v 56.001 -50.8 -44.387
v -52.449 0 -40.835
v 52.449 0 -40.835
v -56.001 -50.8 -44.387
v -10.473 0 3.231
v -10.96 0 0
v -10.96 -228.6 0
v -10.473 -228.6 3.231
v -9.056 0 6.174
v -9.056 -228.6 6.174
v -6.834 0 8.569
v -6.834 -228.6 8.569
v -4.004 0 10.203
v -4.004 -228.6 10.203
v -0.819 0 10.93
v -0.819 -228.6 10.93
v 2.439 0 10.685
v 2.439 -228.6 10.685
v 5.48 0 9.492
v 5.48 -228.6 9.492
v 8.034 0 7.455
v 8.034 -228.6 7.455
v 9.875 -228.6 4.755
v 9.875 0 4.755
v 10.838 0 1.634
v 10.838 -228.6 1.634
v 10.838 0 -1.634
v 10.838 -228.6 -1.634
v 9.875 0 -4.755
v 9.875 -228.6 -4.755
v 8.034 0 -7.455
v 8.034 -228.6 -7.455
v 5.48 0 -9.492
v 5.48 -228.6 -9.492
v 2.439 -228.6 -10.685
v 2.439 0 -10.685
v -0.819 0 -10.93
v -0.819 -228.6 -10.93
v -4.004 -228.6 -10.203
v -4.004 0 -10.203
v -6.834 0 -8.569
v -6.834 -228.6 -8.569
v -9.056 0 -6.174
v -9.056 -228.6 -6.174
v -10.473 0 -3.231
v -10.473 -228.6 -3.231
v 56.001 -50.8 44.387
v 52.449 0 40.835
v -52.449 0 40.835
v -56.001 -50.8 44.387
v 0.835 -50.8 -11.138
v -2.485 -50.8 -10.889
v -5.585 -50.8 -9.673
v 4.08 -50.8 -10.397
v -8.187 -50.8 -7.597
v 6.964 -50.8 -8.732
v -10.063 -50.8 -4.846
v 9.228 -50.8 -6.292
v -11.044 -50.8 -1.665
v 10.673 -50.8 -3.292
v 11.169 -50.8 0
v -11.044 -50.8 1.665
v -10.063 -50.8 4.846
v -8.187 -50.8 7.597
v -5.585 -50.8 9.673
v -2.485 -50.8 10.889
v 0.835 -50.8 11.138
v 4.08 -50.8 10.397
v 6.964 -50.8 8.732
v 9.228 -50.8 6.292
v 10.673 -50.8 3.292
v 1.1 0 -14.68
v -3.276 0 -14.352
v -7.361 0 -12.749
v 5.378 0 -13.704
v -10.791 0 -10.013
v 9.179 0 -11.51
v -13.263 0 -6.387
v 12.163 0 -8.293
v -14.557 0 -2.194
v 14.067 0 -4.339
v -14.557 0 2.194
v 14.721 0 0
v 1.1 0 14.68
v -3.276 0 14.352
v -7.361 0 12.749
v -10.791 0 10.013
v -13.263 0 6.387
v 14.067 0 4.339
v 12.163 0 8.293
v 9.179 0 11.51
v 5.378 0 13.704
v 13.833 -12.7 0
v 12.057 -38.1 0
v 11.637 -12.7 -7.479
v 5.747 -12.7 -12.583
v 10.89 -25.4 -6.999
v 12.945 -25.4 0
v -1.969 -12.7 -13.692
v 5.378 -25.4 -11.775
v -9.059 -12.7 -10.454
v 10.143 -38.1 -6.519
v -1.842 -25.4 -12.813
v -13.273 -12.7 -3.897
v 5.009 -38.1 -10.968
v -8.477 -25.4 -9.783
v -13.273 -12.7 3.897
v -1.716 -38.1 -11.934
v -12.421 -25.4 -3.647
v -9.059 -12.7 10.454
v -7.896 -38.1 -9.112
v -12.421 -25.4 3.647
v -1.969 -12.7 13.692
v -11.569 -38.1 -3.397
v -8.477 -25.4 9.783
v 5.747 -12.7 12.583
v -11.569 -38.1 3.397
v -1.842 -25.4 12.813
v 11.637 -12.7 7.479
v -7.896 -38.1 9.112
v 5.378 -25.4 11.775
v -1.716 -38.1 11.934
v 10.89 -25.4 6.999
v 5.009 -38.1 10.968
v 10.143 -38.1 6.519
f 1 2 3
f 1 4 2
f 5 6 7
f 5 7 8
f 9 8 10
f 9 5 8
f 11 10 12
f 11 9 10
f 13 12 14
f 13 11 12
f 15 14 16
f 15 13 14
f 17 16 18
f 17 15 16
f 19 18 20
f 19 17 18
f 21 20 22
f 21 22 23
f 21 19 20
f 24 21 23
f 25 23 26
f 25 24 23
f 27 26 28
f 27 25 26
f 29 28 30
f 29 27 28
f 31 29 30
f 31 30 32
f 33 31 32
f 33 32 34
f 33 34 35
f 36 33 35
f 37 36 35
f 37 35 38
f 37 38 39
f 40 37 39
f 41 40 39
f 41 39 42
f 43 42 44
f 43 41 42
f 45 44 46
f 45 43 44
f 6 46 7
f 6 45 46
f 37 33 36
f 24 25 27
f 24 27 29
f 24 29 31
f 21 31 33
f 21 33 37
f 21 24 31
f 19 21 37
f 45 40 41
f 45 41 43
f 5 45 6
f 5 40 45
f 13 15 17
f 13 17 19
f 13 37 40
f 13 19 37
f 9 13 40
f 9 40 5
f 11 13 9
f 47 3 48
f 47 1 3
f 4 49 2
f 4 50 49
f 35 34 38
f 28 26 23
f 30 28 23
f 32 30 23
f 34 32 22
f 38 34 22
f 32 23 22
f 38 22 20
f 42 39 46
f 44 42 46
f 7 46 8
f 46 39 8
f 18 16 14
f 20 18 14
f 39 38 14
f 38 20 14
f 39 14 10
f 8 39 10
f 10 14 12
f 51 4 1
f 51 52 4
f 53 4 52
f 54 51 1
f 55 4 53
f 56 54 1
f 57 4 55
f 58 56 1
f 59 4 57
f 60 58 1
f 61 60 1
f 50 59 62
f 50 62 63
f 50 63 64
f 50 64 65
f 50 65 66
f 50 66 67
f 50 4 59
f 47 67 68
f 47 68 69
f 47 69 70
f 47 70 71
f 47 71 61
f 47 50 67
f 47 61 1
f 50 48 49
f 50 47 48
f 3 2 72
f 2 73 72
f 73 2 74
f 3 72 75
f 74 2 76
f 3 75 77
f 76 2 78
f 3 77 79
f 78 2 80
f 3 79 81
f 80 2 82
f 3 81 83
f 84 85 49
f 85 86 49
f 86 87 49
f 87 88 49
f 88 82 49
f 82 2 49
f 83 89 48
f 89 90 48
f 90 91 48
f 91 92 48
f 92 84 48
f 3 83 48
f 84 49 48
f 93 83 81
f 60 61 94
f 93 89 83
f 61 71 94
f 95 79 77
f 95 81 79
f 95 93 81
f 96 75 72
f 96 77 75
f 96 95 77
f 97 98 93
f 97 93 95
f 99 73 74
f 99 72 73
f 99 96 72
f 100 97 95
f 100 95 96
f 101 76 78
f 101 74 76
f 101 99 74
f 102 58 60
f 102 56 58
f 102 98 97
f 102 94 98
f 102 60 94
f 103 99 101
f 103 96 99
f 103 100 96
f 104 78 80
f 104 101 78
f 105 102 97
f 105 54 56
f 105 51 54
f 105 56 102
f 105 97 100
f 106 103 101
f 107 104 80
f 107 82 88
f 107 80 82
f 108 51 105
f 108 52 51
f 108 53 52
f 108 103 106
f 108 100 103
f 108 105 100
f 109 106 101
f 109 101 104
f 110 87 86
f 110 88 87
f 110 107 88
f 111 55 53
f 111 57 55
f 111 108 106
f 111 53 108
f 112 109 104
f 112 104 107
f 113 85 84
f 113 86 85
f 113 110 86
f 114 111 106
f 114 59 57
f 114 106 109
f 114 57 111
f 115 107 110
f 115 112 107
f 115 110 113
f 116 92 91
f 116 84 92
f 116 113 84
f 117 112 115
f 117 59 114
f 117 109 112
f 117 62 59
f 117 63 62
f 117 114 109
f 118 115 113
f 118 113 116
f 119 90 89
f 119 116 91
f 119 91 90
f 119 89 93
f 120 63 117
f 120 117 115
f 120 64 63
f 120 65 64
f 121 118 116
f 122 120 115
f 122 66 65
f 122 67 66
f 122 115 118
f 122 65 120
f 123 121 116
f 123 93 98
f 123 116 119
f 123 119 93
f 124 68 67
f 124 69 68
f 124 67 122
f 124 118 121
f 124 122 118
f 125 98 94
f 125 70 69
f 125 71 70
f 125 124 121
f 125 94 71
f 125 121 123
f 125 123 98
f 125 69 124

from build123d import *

# Parameters (mm, degrees)
F0_W     = 104.8979088664
F0_H     = 81.6691890359
F0_R     = 14.7212853351
F1_DEPTH = 50.8
F1_TAPER = -4
F2_R     = 10.9602017769
F3_DEPTH = 228.6


with BuildPart() as f1:
    # F0 (on Front) → F1 (new body)
    with BuildSketch(Plane.XZ):
        Rectangle(F0_W, F0_H)
        Circle(F0_R, mode=Mode.SUBTRACT)
    extrude(amount=F1_DEPTH, taper=F1_TAPER)


with BuildPart() as f3:
    # F2 (on face) → F3 (new body)
    with BuildSketch(Plane(origin=(0, 0, 0), x_dir=(-1, 0, 0), z_dir=(0, 1, 0))):
        Circle(F2_R)
    extrude(amount=-F3_DEPTH)


solid = Compound([f1.part, f3.part])
